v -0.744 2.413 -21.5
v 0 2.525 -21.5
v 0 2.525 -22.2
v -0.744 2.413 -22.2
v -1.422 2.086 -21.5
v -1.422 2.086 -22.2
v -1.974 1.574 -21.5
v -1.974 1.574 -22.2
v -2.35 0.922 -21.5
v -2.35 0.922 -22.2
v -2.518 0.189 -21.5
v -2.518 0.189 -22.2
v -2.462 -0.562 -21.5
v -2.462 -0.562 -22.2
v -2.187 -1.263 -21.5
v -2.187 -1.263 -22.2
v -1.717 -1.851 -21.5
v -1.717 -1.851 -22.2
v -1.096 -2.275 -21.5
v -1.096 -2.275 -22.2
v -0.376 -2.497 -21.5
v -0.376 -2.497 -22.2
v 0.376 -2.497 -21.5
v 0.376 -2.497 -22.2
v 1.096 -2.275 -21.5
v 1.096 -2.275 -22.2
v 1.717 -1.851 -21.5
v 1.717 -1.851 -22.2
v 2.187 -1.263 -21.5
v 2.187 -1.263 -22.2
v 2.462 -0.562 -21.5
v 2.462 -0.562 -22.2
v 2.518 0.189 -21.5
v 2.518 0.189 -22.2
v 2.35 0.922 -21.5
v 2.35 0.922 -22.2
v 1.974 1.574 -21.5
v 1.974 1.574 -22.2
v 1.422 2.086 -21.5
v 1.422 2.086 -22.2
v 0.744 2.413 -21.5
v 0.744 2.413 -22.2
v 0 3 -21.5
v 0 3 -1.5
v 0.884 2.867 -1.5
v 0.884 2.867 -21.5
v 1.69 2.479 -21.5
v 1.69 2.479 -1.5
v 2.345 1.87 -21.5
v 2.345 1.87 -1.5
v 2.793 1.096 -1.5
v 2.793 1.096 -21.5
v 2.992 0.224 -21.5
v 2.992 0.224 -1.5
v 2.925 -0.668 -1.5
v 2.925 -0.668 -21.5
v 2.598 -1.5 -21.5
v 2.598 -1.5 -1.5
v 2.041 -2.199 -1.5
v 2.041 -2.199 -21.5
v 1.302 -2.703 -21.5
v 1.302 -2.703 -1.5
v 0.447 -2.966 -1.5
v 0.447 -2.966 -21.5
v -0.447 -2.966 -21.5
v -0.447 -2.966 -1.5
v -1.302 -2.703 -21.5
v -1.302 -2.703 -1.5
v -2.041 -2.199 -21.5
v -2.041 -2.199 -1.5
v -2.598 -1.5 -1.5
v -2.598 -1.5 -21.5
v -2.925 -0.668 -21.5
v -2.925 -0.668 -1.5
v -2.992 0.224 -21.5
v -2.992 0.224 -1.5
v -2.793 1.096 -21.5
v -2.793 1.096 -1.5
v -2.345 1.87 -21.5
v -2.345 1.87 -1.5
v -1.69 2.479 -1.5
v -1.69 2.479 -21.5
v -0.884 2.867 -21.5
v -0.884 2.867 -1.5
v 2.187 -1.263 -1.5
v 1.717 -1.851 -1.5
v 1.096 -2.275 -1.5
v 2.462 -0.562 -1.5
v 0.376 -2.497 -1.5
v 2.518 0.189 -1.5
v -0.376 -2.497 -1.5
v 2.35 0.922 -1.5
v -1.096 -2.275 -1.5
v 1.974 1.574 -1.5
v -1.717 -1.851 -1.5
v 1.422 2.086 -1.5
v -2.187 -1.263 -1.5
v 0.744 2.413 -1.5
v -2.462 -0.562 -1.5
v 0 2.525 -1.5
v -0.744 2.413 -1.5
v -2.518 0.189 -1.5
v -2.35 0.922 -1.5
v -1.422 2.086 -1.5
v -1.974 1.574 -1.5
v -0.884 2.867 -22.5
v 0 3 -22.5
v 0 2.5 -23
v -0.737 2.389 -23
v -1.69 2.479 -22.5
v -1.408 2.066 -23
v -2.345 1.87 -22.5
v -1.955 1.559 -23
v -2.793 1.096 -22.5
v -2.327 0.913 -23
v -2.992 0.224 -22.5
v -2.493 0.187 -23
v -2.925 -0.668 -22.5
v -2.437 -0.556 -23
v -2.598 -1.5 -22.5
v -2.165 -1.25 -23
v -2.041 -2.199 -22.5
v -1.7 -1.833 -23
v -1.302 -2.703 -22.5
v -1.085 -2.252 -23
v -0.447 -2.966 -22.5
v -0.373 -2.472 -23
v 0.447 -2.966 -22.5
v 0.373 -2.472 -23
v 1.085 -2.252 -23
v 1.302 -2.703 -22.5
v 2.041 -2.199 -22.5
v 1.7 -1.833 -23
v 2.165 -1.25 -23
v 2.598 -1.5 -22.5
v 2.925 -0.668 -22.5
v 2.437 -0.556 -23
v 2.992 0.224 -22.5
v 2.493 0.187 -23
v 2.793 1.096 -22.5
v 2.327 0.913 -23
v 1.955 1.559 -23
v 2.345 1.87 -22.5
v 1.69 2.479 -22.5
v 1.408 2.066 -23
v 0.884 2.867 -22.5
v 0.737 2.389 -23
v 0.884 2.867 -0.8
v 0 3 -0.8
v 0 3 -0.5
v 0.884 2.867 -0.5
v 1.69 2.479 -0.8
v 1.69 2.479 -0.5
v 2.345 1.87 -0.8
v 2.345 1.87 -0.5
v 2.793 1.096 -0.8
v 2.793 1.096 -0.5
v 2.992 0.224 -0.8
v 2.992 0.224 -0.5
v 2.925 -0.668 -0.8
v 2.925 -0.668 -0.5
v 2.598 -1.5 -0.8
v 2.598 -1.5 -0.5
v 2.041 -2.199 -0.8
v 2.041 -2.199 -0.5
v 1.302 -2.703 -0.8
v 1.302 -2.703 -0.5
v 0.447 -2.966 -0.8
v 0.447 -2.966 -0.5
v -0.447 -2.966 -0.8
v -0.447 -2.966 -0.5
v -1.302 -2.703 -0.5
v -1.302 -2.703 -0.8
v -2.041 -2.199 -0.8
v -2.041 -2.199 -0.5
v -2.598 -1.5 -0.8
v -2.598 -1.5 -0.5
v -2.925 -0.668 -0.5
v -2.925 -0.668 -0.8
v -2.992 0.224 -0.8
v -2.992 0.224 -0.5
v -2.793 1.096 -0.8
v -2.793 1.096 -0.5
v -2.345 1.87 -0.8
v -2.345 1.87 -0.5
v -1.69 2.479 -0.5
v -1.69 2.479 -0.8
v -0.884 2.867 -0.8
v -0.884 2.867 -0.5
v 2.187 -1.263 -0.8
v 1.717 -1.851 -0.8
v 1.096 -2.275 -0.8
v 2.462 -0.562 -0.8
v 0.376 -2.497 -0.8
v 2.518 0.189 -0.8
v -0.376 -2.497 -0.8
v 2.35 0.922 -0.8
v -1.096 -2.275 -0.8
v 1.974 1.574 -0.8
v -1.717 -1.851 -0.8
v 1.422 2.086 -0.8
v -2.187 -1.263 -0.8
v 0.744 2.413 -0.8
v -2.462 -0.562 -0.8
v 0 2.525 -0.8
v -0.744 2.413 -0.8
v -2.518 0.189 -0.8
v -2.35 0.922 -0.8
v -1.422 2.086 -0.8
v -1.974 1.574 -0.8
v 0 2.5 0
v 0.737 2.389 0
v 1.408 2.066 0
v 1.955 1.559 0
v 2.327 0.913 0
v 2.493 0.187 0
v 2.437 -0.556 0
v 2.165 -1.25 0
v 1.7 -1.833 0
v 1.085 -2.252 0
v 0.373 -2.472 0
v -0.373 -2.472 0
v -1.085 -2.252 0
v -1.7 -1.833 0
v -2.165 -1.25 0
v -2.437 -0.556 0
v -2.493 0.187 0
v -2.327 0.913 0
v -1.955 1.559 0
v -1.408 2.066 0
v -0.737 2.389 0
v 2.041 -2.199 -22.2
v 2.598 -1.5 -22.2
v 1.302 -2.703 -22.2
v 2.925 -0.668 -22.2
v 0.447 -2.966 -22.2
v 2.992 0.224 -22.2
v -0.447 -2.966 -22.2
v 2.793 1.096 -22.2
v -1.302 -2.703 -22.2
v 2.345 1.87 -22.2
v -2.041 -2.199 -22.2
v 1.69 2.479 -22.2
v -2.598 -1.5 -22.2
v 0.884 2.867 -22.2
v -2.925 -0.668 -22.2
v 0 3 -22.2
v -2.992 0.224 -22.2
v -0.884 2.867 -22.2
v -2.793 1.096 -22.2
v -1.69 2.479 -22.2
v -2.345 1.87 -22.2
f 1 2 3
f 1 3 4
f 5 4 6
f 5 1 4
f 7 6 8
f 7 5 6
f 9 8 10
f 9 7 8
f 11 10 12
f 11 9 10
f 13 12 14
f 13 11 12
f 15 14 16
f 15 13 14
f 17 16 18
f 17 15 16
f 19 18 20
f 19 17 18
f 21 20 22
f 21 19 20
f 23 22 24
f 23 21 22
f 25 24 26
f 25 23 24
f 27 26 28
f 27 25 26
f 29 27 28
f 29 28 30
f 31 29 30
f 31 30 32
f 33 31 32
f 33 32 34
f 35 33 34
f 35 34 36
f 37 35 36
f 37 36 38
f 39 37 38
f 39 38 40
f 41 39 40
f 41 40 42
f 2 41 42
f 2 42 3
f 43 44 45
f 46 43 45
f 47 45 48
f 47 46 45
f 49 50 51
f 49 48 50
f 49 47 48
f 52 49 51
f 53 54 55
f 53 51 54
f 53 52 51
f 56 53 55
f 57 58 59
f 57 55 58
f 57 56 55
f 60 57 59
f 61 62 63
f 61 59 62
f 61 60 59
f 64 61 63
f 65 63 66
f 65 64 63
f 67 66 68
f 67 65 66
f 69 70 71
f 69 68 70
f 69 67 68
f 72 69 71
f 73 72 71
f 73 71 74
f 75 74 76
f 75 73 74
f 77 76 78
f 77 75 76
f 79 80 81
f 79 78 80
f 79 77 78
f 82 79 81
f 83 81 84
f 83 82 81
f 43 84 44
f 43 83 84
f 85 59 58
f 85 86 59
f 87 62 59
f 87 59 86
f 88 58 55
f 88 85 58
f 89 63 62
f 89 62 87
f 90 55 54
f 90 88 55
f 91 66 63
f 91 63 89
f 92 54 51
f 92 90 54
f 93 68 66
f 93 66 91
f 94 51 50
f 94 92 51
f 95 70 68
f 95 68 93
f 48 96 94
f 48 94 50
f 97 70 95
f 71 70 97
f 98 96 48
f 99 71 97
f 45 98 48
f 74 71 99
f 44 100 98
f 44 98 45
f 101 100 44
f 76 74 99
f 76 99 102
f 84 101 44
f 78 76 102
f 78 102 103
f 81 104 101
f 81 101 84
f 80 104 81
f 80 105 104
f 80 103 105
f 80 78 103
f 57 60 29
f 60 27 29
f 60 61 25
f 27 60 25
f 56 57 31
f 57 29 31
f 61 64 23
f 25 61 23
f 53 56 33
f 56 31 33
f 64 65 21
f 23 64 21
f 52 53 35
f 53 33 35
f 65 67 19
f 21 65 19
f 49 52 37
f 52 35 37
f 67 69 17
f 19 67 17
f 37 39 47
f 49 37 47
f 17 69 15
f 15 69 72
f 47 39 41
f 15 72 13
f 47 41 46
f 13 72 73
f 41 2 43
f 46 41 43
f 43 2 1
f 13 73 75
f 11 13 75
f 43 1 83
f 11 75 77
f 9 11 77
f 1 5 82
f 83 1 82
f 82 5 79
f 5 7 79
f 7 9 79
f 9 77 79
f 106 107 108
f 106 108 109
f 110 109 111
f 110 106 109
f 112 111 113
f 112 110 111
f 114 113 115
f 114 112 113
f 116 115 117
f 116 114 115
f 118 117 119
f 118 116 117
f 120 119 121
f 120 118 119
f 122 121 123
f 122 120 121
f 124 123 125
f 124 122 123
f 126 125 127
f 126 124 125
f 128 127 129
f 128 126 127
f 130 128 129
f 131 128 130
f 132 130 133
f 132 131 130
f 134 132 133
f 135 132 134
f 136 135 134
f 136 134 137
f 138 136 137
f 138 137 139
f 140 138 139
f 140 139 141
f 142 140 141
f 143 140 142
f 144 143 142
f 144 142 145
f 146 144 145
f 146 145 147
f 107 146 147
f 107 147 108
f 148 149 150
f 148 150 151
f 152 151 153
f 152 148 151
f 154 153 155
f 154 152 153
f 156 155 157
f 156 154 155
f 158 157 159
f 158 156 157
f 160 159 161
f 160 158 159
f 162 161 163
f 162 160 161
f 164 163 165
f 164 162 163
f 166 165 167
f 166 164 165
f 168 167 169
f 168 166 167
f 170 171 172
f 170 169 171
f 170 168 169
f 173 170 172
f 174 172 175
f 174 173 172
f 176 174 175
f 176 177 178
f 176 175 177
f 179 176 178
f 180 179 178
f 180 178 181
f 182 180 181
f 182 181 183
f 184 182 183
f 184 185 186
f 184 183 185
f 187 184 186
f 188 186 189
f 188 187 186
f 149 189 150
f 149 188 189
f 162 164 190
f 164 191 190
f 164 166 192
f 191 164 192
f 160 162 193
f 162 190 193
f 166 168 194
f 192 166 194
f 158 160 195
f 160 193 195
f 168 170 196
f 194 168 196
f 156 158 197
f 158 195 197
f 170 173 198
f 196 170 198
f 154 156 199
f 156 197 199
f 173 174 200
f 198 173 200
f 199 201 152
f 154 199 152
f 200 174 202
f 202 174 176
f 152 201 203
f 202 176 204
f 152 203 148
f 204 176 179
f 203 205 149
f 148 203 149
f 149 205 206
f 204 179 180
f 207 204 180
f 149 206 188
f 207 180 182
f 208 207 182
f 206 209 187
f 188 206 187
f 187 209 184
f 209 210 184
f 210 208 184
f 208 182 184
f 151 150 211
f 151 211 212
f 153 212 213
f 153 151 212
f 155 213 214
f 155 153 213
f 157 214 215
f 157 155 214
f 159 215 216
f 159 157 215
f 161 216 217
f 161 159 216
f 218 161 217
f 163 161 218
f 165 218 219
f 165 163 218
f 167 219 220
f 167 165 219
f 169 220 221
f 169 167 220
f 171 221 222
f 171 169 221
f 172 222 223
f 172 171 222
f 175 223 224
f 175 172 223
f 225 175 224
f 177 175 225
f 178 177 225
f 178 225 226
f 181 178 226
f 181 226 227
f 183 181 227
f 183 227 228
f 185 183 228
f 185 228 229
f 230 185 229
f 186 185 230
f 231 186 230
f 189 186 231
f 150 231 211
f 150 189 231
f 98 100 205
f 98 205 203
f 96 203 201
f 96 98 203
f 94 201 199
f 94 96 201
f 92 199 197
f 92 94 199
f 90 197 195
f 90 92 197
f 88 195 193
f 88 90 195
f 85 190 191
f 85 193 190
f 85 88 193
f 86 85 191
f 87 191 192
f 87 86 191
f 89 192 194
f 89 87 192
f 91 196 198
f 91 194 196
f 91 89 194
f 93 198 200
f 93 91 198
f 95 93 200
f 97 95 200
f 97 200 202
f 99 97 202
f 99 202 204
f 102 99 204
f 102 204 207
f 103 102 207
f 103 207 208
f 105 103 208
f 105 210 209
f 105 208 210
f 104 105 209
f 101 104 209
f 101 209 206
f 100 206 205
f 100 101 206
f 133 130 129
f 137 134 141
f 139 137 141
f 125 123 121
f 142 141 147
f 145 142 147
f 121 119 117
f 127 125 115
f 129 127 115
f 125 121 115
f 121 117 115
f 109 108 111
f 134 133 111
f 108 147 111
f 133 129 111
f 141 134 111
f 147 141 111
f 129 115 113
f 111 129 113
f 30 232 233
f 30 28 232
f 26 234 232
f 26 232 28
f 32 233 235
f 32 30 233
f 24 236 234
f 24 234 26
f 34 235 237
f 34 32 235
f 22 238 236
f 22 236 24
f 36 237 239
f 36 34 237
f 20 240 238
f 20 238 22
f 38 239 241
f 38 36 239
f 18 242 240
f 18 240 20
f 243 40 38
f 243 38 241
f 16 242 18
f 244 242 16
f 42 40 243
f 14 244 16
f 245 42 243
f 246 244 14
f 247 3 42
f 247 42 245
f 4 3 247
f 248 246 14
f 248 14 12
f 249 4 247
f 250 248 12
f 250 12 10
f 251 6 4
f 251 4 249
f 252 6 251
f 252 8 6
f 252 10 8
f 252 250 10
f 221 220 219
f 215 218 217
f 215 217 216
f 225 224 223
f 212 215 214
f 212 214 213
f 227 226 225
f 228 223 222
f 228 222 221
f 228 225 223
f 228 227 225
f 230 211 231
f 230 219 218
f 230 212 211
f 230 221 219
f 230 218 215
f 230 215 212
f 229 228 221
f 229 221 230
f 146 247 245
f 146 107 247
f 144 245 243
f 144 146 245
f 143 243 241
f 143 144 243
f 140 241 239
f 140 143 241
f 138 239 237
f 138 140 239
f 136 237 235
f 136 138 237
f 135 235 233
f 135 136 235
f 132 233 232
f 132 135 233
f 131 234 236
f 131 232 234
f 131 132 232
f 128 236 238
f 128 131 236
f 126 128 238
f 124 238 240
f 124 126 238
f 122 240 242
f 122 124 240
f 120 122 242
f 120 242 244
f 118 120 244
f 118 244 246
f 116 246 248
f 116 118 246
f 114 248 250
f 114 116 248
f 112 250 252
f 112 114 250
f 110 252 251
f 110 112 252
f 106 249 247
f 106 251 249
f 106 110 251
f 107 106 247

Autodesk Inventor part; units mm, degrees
ref_plane "YZ Plane" through (0, 0, 0) normal (1, 0, 0) x (0, 1, 0)
ref_plane "XZ Plane" through (0, 0, 0) normal (0, 1, 0) x (-1, 0, 0)
ref_plane "XY Plane" through (0, 0, 0) normal (0, 0, 1) x (1, 0, 0)
sketch "Sketch1" plane through (0, 0, 0) normal (1, 0, 0) x (0, 1, 0)
  line L0 (0, 0) -> (3, 0)
  line L1 (3, 0) -> (3, -23)
  line L2 (3, -23) -> (0, -23)
  line L3 (0, -23) -> (0, 0)
  line L4 (3, -0.8) -> (2.525, -0.8)
  line L5 (2.525, -0.8) -> (2.525, -1.5)
  line L6 (2.525, -1.5) -> (3, -1.5)
  line L7 (3, -1.5) -> (3, -0.8)
  line L8 (3, -22.2) -> (2.525, -22.2)
  line L9 (2.525, -22.2) -> (2.525, -21.5)
  line L10 (2.525, -21.5) -> (3, -21.5)
  line L11 (3, -21.5) -> (3, -22.2)
  point P0 (2.525, -21.85)
  point P1 (3, -21.5)
  point P2 (1.5, -23)
  dimension "d0" = 6
  dimension "d1" = 20
  dimension "d4" = 0.7
  dimension "d5" = 0.7
  dimension "d6" = 5.05
  dimension "d11" = 23
  dimension "d12" = 0.8
revolve "Revolution1" add sketch "Sketch1" angle 360 about axis through (0, 0, -23) along (0, 0, 1) contours L0 L1 L4 L5 L6 L10 L9 L8 L2 L3
chamfer "Chamfer1" distance 0.5 angle 45 2 edges at (0, -3, 0) (0, -3, -23)
equation "\"d5\" = d4"
properties part number "rod pin_CPY"
